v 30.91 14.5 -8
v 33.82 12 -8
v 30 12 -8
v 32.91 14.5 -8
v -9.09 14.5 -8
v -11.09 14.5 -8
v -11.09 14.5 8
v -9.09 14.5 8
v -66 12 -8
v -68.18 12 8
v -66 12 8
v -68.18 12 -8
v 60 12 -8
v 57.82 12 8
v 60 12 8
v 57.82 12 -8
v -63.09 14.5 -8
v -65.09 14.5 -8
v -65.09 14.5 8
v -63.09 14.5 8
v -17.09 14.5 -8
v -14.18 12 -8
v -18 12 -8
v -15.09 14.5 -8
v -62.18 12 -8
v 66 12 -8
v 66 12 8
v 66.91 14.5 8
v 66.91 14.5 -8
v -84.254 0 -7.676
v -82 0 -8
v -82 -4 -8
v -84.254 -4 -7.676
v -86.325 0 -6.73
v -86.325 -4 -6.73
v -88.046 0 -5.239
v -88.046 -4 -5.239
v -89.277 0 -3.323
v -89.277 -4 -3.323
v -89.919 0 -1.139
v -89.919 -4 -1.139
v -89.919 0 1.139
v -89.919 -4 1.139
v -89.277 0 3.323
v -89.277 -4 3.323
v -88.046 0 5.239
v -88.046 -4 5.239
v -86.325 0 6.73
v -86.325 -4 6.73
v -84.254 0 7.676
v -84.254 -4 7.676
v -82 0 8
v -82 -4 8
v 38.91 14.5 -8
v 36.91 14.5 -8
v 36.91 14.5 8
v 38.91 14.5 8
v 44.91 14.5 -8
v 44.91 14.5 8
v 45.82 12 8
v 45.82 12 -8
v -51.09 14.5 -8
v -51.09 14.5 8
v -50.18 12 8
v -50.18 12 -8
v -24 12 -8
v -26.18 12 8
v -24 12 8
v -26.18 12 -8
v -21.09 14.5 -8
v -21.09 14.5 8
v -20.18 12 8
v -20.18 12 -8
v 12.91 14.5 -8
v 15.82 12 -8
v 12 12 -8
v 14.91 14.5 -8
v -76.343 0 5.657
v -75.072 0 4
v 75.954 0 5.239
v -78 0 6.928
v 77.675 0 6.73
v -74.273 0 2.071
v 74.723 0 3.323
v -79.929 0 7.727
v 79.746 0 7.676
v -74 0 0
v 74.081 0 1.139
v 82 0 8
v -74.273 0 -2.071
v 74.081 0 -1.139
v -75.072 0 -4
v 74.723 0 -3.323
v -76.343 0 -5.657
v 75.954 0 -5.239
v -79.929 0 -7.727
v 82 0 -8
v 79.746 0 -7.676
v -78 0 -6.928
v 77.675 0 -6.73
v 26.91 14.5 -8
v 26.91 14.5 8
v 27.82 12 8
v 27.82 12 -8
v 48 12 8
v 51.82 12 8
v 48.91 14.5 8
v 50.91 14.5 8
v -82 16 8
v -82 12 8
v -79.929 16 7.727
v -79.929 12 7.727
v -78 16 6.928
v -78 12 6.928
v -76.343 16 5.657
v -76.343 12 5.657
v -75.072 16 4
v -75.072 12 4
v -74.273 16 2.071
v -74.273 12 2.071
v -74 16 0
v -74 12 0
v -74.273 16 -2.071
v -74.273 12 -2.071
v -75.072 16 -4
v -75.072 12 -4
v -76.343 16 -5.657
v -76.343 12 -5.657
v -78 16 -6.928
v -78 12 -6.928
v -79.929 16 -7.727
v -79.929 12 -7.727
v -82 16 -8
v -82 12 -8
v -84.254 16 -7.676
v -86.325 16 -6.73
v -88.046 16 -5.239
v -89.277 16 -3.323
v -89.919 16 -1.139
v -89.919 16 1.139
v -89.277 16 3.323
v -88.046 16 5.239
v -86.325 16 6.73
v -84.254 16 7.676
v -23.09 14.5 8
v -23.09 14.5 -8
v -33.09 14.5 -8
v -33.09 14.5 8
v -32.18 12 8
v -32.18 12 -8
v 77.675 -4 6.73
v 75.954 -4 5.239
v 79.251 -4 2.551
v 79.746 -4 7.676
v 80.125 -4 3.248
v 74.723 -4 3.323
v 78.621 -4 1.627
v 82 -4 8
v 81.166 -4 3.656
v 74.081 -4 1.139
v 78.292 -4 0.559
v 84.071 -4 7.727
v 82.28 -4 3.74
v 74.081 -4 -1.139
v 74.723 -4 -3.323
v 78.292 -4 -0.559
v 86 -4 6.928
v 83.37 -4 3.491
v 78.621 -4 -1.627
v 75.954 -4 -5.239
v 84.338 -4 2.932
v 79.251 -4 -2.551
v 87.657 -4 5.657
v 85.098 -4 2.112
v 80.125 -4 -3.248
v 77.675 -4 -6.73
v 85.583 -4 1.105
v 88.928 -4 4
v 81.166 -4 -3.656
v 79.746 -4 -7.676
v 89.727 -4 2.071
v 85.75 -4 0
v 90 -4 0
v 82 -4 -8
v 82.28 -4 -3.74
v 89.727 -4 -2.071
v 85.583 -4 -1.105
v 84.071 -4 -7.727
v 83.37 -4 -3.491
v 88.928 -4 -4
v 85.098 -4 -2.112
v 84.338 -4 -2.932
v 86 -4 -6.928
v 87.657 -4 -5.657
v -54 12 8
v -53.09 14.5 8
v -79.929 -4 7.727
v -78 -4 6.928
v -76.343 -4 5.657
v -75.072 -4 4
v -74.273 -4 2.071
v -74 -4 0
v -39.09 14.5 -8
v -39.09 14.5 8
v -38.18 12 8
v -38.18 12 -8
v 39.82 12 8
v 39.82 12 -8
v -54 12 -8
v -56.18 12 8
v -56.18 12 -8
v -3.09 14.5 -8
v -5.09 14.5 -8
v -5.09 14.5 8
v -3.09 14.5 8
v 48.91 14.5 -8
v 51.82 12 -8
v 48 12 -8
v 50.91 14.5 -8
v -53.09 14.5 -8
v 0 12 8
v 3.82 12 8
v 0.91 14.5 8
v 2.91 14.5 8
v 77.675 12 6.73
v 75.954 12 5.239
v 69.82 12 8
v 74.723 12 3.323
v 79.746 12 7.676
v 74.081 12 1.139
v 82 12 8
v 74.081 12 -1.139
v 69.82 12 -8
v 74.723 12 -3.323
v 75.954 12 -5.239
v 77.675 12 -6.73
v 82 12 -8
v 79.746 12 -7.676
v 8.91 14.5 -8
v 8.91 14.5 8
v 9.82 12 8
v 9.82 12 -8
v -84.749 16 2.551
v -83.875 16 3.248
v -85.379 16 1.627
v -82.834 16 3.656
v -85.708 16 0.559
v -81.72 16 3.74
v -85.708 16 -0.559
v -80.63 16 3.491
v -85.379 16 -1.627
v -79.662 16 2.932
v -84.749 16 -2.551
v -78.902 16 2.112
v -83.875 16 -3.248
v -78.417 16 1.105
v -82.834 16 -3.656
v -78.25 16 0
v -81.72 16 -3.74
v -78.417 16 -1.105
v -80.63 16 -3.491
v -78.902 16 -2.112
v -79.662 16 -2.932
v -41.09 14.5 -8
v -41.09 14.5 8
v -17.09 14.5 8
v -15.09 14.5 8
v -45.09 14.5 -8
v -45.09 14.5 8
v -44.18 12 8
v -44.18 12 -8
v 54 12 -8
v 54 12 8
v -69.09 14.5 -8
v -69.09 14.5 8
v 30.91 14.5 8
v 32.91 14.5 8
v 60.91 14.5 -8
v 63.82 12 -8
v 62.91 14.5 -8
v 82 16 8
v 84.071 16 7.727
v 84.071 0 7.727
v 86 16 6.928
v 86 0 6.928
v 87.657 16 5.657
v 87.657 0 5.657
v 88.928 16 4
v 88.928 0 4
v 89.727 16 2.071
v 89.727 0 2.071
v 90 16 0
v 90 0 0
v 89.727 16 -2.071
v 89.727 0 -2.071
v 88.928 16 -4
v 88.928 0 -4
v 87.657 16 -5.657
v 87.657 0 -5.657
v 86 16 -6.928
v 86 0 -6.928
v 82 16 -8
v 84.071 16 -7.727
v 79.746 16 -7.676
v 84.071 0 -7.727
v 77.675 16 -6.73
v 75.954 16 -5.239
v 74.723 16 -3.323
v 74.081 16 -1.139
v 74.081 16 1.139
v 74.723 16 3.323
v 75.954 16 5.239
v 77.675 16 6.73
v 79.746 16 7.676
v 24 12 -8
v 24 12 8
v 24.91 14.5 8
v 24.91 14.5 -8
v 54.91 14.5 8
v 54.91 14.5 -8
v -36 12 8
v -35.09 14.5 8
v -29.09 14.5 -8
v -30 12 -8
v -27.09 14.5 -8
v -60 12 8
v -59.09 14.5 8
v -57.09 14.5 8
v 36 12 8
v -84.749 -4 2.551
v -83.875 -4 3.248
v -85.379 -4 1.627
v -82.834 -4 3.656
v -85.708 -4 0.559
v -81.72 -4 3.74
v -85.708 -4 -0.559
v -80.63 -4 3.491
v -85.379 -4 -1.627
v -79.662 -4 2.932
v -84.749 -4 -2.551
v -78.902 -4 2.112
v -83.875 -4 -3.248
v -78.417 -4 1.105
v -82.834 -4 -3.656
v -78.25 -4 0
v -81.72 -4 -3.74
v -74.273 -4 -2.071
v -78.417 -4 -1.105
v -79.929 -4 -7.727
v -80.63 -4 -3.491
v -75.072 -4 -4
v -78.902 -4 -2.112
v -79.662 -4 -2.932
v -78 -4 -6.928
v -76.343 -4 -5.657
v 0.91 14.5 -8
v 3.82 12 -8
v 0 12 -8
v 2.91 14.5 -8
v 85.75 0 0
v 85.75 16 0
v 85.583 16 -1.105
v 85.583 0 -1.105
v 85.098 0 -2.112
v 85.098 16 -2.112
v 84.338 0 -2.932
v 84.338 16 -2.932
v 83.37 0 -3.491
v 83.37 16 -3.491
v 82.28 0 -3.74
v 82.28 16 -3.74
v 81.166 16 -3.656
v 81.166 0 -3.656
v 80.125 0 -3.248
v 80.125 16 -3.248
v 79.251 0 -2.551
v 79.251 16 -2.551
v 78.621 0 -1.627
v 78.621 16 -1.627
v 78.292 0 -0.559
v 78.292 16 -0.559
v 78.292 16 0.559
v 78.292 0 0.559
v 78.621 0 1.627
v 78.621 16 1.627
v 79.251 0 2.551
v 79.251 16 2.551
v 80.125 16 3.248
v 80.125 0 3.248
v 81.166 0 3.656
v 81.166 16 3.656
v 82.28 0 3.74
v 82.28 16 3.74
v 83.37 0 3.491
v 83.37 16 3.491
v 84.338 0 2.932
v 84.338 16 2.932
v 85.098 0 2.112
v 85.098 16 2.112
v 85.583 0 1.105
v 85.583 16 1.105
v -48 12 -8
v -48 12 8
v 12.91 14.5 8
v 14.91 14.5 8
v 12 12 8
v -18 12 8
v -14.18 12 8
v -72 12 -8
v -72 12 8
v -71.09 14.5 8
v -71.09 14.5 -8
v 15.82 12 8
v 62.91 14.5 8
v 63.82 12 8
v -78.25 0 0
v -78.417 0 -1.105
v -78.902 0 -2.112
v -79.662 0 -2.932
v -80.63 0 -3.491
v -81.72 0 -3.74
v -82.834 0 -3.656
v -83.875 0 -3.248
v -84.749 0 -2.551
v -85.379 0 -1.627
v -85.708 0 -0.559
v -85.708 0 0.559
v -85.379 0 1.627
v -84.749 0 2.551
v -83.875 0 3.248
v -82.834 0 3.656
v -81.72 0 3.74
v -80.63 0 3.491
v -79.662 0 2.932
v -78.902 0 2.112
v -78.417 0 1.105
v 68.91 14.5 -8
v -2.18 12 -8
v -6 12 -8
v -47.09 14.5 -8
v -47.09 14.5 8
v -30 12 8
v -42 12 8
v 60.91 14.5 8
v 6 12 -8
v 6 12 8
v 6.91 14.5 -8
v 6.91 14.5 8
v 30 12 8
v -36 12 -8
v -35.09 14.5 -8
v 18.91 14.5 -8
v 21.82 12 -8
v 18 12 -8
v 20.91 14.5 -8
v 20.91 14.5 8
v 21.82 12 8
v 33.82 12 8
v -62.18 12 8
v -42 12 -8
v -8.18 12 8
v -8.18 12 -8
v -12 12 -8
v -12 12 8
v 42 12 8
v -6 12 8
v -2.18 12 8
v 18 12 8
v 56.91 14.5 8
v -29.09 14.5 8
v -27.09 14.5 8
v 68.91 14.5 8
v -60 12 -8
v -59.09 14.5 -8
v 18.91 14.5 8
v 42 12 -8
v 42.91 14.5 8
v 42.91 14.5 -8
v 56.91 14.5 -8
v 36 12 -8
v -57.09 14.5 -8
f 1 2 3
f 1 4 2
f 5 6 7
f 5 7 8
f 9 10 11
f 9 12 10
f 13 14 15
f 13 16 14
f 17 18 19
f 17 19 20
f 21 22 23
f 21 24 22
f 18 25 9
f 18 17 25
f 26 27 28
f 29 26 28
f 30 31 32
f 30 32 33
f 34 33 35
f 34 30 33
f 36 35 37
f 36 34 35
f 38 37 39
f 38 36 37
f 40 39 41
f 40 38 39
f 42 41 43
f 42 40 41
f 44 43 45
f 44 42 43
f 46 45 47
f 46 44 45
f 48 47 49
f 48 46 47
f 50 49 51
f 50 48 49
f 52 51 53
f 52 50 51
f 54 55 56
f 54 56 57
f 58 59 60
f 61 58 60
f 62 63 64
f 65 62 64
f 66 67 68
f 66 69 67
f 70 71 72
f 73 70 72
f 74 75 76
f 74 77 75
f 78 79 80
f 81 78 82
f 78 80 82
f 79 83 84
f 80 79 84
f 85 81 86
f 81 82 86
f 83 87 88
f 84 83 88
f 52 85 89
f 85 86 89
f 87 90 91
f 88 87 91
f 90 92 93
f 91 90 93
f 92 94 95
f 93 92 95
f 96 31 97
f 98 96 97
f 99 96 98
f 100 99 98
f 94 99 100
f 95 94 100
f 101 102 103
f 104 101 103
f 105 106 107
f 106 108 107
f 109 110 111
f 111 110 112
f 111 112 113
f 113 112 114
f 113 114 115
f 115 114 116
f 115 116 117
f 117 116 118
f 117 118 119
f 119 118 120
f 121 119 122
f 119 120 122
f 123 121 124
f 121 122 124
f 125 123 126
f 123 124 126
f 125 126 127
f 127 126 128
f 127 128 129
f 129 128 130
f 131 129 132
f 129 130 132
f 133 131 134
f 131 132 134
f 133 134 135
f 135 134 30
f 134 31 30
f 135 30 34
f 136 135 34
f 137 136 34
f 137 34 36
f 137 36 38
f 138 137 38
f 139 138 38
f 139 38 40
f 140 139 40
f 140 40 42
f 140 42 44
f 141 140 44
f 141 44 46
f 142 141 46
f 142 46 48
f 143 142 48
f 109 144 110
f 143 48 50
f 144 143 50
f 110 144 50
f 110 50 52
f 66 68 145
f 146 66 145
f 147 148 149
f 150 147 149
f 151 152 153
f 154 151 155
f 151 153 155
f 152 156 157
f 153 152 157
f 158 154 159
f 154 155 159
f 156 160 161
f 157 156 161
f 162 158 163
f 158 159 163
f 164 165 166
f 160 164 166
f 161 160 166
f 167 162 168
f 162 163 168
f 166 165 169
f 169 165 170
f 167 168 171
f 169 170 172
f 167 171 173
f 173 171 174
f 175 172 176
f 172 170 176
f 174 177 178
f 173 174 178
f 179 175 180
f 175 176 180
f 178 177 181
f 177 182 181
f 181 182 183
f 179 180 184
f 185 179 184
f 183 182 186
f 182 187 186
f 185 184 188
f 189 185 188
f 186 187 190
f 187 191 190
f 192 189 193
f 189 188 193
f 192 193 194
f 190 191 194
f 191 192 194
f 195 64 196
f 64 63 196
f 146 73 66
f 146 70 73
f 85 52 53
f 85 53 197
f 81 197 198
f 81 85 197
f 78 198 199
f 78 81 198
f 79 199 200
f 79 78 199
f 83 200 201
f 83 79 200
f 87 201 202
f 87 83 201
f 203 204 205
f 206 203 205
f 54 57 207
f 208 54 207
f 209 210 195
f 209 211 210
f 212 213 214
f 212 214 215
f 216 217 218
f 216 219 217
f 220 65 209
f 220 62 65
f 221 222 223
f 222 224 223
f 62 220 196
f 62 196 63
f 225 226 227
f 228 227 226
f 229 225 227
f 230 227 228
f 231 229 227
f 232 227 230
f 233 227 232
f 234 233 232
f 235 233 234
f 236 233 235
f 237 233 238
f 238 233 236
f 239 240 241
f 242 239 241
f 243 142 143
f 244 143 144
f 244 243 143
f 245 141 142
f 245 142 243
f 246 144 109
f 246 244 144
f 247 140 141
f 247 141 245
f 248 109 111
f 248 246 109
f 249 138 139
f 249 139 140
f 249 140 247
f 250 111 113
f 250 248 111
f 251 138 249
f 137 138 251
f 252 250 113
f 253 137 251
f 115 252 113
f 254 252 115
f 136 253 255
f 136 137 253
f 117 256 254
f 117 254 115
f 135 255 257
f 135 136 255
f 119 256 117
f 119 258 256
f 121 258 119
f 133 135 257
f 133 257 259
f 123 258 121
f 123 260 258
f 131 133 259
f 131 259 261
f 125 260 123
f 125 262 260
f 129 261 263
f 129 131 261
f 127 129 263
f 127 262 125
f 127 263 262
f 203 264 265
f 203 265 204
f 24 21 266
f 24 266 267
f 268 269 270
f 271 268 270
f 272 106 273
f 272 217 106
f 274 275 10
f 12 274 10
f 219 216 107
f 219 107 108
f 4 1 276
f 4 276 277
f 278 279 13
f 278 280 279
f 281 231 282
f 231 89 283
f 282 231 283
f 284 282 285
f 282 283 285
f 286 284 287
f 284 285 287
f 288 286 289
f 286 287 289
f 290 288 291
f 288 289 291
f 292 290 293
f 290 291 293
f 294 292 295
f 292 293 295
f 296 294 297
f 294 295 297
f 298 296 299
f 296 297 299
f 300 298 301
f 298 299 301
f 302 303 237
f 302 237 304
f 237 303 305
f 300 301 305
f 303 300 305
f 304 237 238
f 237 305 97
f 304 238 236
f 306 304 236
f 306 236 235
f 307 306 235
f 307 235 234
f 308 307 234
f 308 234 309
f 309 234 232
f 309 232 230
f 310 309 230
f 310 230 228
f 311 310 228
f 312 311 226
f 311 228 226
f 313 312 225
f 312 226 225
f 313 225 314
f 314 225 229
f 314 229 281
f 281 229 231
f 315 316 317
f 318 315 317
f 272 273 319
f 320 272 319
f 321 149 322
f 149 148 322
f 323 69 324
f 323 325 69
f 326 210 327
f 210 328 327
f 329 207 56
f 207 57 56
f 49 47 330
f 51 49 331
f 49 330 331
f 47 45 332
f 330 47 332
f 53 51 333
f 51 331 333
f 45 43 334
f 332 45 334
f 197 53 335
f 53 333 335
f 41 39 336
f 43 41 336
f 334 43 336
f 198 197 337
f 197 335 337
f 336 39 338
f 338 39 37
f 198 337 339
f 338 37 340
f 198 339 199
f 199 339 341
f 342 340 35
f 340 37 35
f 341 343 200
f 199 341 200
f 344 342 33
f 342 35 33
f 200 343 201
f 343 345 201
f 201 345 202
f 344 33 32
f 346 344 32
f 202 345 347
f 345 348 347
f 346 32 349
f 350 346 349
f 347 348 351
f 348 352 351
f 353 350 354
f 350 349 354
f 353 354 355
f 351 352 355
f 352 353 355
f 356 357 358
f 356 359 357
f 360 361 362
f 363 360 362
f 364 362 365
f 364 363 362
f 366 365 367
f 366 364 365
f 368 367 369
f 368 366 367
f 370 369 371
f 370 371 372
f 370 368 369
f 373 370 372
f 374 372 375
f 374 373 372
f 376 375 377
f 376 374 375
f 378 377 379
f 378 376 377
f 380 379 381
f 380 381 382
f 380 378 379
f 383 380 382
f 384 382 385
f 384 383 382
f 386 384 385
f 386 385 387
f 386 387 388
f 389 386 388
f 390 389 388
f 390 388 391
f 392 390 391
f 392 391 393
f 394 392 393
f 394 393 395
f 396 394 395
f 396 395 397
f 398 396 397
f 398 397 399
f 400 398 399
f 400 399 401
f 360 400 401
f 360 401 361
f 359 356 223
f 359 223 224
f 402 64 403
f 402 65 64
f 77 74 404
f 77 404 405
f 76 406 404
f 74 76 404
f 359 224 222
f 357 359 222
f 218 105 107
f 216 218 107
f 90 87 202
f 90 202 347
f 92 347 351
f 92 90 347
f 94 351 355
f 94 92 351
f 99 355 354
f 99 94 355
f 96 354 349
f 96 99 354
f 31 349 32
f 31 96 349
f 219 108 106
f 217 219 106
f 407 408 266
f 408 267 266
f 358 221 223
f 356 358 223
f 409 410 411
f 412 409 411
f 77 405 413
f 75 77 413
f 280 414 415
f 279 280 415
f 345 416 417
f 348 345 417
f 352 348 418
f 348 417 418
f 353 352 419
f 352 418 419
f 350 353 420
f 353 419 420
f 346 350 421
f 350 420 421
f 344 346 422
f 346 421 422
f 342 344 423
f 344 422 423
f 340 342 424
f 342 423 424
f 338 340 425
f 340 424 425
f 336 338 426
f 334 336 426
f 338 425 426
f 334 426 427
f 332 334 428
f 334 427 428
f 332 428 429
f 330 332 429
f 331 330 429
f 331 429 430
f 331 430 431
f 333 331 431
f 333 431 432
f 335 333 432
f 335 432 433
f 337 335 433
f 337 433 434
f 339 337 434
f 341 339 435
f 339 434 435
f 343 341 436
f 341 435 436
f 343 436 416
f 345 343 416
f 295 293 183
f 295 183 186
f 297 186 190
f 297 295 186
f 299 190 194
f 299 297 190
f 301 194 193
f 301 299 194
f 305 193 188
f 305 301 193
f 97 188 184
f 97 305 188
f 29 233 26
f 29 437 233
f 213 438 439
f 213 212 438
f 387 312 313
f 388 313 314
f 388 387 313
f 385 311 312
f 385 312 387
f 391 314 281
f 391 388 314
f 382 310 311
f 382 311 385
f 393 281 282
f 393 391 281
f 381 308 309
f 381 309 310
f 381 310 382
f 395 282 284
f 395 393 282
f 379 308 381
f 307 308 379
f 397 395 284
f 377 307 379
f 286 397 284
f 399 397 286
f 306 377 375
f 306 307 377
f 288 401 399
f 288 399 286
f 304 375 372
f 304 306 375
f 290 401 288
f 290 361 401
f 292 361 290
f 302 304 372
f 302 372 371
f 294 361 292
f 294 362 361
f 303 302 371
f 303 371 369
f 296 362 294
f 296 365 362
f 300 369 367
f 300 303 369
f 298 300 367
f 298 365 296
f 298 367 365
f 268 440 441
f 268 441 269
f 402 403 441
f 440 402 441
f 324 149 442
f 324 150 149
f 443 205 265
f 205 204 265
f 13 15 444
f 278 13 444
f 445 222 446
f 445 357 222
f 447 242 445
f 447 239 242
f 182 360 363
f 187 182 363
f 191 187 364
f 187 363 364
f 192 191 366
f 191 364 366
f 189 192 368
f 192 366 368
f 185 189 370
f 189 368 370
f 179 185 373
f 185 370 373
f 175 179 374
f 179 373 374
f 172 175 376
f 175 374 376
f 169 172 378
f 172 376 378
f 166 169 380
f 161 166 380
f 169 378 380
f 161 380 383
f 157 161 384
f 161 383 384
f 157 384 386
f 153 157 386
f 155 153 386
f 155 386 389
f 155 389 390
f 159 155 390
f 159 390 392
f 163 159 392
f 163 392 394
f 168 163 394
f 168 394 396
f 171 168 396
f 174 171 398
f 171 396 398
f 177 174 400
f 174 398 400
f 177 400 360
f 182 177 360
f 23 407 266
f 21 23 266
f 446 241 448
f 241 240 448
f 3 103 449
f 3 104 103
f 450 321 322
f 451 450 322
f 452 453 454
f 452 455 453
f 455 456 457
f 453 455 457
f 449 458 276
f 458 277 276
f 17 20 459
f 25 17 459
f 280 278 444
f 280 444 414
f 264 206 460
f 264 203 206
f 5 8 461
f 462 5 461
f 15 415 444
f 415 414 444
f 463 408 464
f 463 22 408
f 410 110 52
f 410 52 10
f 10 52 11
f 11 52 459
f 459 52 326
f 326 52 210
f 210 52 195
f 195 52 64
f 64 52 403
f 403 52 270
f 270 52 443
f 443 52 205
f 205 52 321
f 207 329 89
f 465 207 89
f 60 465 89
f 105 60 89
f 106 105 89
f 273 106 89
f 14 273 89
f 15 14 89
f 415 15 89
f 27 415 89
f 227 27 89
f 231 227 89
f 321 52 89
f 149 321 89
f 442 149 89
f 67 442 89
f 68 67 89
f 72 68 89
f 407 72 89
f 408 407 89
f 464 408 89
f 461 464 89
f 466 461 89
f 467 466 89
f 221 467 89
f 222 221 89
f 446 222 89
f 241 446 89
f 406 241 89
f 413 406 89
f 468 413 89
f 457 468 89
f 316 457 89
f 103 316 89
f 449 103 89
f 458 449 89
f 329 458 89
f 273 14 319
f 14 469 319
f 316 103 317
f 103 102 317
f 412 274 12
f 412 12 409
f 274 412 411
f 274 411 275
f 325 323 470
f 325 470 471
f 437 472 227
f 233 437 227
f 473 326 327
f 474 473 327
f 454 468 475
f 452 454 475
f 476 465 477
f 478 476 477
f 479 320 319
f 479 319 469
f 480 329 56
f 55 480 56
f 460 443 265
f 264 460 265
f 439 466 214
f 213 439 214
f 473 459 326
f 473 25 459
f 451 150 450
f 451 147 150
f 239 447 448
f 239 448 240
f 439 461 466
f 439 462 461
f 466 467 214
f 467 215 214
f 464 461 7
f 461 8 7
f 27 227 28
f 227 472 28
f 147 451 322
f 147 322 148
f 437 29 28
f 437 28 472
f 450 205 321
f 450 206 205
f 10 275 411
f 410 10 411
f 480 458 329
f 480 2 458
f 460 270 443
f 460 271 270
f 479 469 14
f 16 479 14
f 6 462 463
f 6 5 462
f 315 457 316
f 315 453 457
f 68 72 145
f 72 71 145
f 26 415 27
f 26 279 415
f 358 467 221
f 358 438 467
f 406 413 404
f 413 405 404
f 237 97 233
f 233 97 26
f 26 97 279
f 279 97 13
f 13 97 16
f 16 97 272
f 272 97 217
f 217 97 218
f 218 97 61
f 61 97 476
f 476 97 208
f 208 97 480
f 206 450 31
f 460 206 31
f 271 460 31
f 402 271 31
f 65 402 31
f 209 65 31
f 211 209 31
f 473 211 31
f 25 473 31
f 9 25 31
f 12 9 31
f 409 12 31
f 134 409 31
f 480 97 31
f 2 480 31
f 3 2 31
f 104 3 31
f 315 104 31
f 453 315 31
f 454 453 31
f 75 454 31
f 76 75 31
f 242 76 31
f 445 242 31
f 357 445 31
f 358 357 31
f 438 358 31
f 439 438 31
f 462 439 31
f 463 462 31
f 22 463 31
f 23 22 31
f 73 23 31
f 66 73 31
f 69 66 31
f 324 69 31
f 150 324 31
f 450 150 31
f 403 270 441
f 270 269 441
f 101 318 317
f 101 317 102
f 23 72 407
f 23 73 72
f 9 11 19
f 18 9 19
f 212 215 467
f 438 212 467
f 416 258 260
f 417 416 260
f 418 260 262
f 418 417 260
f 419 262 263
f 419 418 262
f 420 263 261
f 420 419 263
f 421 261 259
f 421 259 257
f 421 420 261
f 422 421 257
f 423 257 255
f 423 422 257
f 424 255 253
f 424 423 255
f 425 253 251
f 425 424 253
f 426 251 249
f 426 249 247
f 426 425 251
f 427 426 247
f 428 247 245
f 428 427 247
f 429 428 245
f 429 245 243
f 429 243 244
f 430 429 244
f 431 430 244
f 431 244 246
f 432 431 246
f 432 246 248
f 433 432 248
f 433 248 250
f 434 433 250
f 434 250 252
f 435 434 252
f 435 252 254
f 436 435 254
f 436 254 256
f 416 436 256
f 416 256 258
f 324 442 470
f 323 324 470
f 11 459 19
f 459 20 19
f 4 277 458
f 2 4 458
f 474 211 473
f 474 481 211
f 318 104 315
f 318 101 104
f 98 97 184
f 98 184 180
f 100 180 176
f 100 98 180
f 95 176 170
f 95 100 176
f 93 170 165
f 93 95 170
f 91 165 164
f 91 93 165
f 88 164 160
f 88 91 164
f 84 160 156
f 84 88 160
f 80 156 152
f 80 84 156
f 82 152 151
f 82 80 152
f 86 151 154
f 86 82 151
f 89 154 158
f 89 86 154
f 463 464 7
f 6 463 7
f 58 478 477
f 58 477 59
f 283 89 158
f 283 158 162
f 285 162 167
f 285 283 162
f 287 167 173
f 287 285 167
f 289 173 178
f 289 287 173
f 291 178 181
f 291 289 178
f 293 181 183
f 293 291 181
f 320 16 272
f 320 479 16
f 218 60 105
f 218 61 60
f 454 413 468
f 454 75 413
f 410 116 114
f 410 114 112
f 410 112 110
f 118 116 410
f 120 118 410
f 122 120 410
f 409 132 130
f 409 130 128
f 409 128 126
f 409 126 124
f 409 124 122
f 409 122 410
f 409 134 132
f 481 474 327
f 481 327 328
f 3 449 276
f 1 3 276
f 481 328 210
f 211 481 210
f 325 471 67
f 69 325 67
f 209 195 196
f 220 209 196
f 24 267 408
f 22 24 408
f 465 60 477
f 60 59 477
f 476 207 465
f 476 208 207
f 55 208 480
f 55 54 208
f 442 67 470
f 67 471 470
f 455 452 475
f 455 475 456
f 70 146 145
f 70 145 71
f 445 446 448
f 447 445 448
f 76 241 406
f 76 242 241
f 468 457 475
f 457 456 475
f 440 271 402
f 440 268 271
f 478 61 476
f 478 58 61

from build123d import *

# Parameters (mm, degrees)
SKETCH1_R                = 3.75
BOSS_EXTRUDE1_DEPTH      = 12
SKETCH1_3_R              = 3.75
BOSS_EXTRUDE2_DEPTH      = 16
BOSS_EXTRUDE2_DEPTH_BACK = 4
BOSS_EXTRUDE3_DEPTH      = 16


with BuildPart() as part:
    # Sketch1 → Boss-Extrude1 (new body)
    with BuildSketch(Plane(origin=(0, 0, 0), x_dir=(1, 0, 0), z_dir=(0, 1, 0))):
        with BuildLine():
            Line((82, 8), (-82, 8))
            ThreePointArc((-82, 8), (-76.343145751, 5.656854249), (-74, 0))
            ThreePointArc((-74, 0), (-76.343145751, -5.656854249), (-82, -8))
            Line((-82, -8), (82, -8))
            ThreePointArc((82, -8), (74, 0), (82, 8))
        make_face()
        with BuildLine():
            ThreePointArc((-74, 0), (-76.343145751, 5.656854249), (-82, 8))
            ThreePointArc((-82, 8), (-90, 0), (-82, -8))
            ThreePointArc((-82, -8), (-76.343145751, -5.656854249), (-74, 0))
        make_face()
        with Locations((-82, 0)):
            Circle(SKETCH1_R, mode=Mode.SUBTRACT)
        with BuildLine():
            ThreePointArc((90, 0), (87.656854249, 5.656854249), (82, 8))
            ThreePointArc((82, 8), (74, 0), (82, -8))
            ThreePointArc((82, -8), (87.656854249, -5.656854249), (90, 0))
        make_face()
        with Locations((82, 0)):
            Circle(SKETCH1_R, mode=Mode.SUBTRACT)
    extrude(amount=BOSS_EXTRUDE1_DEPTH)

    # Sketch1_3 → Boss-Extrude2 (add, two sides)
    with BuildSketch(Plane(origin=(0, 0, 0), x_dir=(1, 0, 0), z_dir=(0, 1, 0))) as boss_extrude2_sk:
        with BuildLine():
            ThreePointArc((-74, 0), (-76.343145751, 5.656854249), (-82, 8))
            ThreePointArc((-82, 8), (-90, 0), (-82, -8))
            ThreePointArc((-82, -8), (-76.343145751, -5.656854249), (-74, 0))
        make_face()
        with Locations((-82, 0)):
            Circle(SKETCH1_3_R, mode=Mode.SUBTRACT)
        with BuildLine():
            ThreePointArc((90, 0), (87.656854249, 5.656854249), (82, 8))
            ThreePointArc((82, 8), (74, 0), (82, -8))
            ThreePointArc((82, -8), (87.656854249, -5.656854249), (90, 0))
        make_face()
        with Locations((82, 0)):
            Circle(SKETCH1_3_R, mode=Mode.SUBTRACT)
    extrude(amount=BOSS_EXTRUDE2_DEPTH)
    extrude(boss_extrude2_sk.sketch, amount=-BOSS_EXTRUDE2_DEPTH_BACK)

    # Sketch2 → Boss-Extrude3 (add)
    with BuildSketch(Plane.XY.offset(8)):
        Polygon((-72, 12), (-71.090074414, 14.5), (-69.090074414, 14.5), (-68.180148829, 12), align=None)
        Polygon((-62.180148829, 12), (-66, 12), (-65.090074414, 14.5), (-63.090074414, 14.5), align=None)
        Polygon((-56.180148829, 12), (-60, 12), (-59.090074414, 14.5), (-57.090074414, 14.5), align=None)
        Polygon((-50.180148829, 12), (-54, 12), (-53.090074414, 14.5), (-51.090074414, 14.5), align=None)
        Polygon((-44.180148829, 12), (-48, 12), (-47.090074414, 14.5), (-45.090074414, 14.5), align=None)
        Polygon((-38.180148829, 12), (-42, 12), (-41.090074414, 14.5), (-39.090074414, 14.5), align=None)
        Polygon((-32.180148829, 12), (-36, 12), (-35.090074414, 14.5), (-33.090074414, 14.5), align=None)
        Polygon((-26.180148829, 12), (-30, 12), (-29.090074414, 14.5), (-27.090074414, 14.5), align=None)
        Polygon((-20.180148829, 12), (-24, 12), (-23.090074414, 14.5), (-21.090074414, 14.5), align=None)
        Polygon((-14.180148829, 12), (-18, 12), (-17.090074414, 14.5), (-15.090074414, 14.5), align=None)
        Polygon((-8.180148829, 12), (-12, 12), (-11.090074414, 14.5), (-9.090074414, 14.5), align=None)
        Polygon((-2.180148829, 12), (-6, 12), (-5.090074414, 14.5), (-3.090074414, 14.5), align=None)
        Polygon((3.819851171, 12), (0, 12), (0.909925586, 14.5), (2.909925586, 14.5), align=None)
        Polygon((9.819851171, 12), (6, 12), (6.909925586, 14.5), (8.909925586, 14.5), align=None)
        Polygon((15.819851171, 12), (12, 12), (12.909925586, 14.5), (14.909925586, 14.5), align=None)
        Polygon((21.819851171, 12), (18, 12), (18.909925586, 14.5), (20.909925586, 14.5), align=None)
        Polygon((27.819851171, 12), (24, 12), (24.909925586, 14.5), (26.909925586, 14.5), align=None)
        Polygon((33.819851171, 12), (30, 12), (30.909925586, 14.5), (32.909925586, 14.5), align=None)
        Polygon((39.819851171, 12), (36, 12), (36.909925586, 14.5), (38.909925586, 14.5), align=None)
        Polygon((45.819851171, 12), (42, 12), (42.909925586, 14.5), (44.909925586, 14.5), align=None)
        Polygon((51.819851171, 12), (48, 12), (48.909925586, 14.5), (50.909925586, 14.5), align=None)
        Polygon((57.819851171, 12), (54, 12), (54.909925586, 14.5), (56.909925586, 14.5), align=None)
        Polygon((63.819851171, 12), (60, 12), (60.909925586, 14.5), (62.909925586, 14.5), align=None)
        Polygon((69.819851171, 12), (66, 12), (66.909925586, 14.5), (68.909925586, 14.5), align=None)
    extrude(amount=-BOSS_EXTRUDE3_DEPTH)


solid = part.part
